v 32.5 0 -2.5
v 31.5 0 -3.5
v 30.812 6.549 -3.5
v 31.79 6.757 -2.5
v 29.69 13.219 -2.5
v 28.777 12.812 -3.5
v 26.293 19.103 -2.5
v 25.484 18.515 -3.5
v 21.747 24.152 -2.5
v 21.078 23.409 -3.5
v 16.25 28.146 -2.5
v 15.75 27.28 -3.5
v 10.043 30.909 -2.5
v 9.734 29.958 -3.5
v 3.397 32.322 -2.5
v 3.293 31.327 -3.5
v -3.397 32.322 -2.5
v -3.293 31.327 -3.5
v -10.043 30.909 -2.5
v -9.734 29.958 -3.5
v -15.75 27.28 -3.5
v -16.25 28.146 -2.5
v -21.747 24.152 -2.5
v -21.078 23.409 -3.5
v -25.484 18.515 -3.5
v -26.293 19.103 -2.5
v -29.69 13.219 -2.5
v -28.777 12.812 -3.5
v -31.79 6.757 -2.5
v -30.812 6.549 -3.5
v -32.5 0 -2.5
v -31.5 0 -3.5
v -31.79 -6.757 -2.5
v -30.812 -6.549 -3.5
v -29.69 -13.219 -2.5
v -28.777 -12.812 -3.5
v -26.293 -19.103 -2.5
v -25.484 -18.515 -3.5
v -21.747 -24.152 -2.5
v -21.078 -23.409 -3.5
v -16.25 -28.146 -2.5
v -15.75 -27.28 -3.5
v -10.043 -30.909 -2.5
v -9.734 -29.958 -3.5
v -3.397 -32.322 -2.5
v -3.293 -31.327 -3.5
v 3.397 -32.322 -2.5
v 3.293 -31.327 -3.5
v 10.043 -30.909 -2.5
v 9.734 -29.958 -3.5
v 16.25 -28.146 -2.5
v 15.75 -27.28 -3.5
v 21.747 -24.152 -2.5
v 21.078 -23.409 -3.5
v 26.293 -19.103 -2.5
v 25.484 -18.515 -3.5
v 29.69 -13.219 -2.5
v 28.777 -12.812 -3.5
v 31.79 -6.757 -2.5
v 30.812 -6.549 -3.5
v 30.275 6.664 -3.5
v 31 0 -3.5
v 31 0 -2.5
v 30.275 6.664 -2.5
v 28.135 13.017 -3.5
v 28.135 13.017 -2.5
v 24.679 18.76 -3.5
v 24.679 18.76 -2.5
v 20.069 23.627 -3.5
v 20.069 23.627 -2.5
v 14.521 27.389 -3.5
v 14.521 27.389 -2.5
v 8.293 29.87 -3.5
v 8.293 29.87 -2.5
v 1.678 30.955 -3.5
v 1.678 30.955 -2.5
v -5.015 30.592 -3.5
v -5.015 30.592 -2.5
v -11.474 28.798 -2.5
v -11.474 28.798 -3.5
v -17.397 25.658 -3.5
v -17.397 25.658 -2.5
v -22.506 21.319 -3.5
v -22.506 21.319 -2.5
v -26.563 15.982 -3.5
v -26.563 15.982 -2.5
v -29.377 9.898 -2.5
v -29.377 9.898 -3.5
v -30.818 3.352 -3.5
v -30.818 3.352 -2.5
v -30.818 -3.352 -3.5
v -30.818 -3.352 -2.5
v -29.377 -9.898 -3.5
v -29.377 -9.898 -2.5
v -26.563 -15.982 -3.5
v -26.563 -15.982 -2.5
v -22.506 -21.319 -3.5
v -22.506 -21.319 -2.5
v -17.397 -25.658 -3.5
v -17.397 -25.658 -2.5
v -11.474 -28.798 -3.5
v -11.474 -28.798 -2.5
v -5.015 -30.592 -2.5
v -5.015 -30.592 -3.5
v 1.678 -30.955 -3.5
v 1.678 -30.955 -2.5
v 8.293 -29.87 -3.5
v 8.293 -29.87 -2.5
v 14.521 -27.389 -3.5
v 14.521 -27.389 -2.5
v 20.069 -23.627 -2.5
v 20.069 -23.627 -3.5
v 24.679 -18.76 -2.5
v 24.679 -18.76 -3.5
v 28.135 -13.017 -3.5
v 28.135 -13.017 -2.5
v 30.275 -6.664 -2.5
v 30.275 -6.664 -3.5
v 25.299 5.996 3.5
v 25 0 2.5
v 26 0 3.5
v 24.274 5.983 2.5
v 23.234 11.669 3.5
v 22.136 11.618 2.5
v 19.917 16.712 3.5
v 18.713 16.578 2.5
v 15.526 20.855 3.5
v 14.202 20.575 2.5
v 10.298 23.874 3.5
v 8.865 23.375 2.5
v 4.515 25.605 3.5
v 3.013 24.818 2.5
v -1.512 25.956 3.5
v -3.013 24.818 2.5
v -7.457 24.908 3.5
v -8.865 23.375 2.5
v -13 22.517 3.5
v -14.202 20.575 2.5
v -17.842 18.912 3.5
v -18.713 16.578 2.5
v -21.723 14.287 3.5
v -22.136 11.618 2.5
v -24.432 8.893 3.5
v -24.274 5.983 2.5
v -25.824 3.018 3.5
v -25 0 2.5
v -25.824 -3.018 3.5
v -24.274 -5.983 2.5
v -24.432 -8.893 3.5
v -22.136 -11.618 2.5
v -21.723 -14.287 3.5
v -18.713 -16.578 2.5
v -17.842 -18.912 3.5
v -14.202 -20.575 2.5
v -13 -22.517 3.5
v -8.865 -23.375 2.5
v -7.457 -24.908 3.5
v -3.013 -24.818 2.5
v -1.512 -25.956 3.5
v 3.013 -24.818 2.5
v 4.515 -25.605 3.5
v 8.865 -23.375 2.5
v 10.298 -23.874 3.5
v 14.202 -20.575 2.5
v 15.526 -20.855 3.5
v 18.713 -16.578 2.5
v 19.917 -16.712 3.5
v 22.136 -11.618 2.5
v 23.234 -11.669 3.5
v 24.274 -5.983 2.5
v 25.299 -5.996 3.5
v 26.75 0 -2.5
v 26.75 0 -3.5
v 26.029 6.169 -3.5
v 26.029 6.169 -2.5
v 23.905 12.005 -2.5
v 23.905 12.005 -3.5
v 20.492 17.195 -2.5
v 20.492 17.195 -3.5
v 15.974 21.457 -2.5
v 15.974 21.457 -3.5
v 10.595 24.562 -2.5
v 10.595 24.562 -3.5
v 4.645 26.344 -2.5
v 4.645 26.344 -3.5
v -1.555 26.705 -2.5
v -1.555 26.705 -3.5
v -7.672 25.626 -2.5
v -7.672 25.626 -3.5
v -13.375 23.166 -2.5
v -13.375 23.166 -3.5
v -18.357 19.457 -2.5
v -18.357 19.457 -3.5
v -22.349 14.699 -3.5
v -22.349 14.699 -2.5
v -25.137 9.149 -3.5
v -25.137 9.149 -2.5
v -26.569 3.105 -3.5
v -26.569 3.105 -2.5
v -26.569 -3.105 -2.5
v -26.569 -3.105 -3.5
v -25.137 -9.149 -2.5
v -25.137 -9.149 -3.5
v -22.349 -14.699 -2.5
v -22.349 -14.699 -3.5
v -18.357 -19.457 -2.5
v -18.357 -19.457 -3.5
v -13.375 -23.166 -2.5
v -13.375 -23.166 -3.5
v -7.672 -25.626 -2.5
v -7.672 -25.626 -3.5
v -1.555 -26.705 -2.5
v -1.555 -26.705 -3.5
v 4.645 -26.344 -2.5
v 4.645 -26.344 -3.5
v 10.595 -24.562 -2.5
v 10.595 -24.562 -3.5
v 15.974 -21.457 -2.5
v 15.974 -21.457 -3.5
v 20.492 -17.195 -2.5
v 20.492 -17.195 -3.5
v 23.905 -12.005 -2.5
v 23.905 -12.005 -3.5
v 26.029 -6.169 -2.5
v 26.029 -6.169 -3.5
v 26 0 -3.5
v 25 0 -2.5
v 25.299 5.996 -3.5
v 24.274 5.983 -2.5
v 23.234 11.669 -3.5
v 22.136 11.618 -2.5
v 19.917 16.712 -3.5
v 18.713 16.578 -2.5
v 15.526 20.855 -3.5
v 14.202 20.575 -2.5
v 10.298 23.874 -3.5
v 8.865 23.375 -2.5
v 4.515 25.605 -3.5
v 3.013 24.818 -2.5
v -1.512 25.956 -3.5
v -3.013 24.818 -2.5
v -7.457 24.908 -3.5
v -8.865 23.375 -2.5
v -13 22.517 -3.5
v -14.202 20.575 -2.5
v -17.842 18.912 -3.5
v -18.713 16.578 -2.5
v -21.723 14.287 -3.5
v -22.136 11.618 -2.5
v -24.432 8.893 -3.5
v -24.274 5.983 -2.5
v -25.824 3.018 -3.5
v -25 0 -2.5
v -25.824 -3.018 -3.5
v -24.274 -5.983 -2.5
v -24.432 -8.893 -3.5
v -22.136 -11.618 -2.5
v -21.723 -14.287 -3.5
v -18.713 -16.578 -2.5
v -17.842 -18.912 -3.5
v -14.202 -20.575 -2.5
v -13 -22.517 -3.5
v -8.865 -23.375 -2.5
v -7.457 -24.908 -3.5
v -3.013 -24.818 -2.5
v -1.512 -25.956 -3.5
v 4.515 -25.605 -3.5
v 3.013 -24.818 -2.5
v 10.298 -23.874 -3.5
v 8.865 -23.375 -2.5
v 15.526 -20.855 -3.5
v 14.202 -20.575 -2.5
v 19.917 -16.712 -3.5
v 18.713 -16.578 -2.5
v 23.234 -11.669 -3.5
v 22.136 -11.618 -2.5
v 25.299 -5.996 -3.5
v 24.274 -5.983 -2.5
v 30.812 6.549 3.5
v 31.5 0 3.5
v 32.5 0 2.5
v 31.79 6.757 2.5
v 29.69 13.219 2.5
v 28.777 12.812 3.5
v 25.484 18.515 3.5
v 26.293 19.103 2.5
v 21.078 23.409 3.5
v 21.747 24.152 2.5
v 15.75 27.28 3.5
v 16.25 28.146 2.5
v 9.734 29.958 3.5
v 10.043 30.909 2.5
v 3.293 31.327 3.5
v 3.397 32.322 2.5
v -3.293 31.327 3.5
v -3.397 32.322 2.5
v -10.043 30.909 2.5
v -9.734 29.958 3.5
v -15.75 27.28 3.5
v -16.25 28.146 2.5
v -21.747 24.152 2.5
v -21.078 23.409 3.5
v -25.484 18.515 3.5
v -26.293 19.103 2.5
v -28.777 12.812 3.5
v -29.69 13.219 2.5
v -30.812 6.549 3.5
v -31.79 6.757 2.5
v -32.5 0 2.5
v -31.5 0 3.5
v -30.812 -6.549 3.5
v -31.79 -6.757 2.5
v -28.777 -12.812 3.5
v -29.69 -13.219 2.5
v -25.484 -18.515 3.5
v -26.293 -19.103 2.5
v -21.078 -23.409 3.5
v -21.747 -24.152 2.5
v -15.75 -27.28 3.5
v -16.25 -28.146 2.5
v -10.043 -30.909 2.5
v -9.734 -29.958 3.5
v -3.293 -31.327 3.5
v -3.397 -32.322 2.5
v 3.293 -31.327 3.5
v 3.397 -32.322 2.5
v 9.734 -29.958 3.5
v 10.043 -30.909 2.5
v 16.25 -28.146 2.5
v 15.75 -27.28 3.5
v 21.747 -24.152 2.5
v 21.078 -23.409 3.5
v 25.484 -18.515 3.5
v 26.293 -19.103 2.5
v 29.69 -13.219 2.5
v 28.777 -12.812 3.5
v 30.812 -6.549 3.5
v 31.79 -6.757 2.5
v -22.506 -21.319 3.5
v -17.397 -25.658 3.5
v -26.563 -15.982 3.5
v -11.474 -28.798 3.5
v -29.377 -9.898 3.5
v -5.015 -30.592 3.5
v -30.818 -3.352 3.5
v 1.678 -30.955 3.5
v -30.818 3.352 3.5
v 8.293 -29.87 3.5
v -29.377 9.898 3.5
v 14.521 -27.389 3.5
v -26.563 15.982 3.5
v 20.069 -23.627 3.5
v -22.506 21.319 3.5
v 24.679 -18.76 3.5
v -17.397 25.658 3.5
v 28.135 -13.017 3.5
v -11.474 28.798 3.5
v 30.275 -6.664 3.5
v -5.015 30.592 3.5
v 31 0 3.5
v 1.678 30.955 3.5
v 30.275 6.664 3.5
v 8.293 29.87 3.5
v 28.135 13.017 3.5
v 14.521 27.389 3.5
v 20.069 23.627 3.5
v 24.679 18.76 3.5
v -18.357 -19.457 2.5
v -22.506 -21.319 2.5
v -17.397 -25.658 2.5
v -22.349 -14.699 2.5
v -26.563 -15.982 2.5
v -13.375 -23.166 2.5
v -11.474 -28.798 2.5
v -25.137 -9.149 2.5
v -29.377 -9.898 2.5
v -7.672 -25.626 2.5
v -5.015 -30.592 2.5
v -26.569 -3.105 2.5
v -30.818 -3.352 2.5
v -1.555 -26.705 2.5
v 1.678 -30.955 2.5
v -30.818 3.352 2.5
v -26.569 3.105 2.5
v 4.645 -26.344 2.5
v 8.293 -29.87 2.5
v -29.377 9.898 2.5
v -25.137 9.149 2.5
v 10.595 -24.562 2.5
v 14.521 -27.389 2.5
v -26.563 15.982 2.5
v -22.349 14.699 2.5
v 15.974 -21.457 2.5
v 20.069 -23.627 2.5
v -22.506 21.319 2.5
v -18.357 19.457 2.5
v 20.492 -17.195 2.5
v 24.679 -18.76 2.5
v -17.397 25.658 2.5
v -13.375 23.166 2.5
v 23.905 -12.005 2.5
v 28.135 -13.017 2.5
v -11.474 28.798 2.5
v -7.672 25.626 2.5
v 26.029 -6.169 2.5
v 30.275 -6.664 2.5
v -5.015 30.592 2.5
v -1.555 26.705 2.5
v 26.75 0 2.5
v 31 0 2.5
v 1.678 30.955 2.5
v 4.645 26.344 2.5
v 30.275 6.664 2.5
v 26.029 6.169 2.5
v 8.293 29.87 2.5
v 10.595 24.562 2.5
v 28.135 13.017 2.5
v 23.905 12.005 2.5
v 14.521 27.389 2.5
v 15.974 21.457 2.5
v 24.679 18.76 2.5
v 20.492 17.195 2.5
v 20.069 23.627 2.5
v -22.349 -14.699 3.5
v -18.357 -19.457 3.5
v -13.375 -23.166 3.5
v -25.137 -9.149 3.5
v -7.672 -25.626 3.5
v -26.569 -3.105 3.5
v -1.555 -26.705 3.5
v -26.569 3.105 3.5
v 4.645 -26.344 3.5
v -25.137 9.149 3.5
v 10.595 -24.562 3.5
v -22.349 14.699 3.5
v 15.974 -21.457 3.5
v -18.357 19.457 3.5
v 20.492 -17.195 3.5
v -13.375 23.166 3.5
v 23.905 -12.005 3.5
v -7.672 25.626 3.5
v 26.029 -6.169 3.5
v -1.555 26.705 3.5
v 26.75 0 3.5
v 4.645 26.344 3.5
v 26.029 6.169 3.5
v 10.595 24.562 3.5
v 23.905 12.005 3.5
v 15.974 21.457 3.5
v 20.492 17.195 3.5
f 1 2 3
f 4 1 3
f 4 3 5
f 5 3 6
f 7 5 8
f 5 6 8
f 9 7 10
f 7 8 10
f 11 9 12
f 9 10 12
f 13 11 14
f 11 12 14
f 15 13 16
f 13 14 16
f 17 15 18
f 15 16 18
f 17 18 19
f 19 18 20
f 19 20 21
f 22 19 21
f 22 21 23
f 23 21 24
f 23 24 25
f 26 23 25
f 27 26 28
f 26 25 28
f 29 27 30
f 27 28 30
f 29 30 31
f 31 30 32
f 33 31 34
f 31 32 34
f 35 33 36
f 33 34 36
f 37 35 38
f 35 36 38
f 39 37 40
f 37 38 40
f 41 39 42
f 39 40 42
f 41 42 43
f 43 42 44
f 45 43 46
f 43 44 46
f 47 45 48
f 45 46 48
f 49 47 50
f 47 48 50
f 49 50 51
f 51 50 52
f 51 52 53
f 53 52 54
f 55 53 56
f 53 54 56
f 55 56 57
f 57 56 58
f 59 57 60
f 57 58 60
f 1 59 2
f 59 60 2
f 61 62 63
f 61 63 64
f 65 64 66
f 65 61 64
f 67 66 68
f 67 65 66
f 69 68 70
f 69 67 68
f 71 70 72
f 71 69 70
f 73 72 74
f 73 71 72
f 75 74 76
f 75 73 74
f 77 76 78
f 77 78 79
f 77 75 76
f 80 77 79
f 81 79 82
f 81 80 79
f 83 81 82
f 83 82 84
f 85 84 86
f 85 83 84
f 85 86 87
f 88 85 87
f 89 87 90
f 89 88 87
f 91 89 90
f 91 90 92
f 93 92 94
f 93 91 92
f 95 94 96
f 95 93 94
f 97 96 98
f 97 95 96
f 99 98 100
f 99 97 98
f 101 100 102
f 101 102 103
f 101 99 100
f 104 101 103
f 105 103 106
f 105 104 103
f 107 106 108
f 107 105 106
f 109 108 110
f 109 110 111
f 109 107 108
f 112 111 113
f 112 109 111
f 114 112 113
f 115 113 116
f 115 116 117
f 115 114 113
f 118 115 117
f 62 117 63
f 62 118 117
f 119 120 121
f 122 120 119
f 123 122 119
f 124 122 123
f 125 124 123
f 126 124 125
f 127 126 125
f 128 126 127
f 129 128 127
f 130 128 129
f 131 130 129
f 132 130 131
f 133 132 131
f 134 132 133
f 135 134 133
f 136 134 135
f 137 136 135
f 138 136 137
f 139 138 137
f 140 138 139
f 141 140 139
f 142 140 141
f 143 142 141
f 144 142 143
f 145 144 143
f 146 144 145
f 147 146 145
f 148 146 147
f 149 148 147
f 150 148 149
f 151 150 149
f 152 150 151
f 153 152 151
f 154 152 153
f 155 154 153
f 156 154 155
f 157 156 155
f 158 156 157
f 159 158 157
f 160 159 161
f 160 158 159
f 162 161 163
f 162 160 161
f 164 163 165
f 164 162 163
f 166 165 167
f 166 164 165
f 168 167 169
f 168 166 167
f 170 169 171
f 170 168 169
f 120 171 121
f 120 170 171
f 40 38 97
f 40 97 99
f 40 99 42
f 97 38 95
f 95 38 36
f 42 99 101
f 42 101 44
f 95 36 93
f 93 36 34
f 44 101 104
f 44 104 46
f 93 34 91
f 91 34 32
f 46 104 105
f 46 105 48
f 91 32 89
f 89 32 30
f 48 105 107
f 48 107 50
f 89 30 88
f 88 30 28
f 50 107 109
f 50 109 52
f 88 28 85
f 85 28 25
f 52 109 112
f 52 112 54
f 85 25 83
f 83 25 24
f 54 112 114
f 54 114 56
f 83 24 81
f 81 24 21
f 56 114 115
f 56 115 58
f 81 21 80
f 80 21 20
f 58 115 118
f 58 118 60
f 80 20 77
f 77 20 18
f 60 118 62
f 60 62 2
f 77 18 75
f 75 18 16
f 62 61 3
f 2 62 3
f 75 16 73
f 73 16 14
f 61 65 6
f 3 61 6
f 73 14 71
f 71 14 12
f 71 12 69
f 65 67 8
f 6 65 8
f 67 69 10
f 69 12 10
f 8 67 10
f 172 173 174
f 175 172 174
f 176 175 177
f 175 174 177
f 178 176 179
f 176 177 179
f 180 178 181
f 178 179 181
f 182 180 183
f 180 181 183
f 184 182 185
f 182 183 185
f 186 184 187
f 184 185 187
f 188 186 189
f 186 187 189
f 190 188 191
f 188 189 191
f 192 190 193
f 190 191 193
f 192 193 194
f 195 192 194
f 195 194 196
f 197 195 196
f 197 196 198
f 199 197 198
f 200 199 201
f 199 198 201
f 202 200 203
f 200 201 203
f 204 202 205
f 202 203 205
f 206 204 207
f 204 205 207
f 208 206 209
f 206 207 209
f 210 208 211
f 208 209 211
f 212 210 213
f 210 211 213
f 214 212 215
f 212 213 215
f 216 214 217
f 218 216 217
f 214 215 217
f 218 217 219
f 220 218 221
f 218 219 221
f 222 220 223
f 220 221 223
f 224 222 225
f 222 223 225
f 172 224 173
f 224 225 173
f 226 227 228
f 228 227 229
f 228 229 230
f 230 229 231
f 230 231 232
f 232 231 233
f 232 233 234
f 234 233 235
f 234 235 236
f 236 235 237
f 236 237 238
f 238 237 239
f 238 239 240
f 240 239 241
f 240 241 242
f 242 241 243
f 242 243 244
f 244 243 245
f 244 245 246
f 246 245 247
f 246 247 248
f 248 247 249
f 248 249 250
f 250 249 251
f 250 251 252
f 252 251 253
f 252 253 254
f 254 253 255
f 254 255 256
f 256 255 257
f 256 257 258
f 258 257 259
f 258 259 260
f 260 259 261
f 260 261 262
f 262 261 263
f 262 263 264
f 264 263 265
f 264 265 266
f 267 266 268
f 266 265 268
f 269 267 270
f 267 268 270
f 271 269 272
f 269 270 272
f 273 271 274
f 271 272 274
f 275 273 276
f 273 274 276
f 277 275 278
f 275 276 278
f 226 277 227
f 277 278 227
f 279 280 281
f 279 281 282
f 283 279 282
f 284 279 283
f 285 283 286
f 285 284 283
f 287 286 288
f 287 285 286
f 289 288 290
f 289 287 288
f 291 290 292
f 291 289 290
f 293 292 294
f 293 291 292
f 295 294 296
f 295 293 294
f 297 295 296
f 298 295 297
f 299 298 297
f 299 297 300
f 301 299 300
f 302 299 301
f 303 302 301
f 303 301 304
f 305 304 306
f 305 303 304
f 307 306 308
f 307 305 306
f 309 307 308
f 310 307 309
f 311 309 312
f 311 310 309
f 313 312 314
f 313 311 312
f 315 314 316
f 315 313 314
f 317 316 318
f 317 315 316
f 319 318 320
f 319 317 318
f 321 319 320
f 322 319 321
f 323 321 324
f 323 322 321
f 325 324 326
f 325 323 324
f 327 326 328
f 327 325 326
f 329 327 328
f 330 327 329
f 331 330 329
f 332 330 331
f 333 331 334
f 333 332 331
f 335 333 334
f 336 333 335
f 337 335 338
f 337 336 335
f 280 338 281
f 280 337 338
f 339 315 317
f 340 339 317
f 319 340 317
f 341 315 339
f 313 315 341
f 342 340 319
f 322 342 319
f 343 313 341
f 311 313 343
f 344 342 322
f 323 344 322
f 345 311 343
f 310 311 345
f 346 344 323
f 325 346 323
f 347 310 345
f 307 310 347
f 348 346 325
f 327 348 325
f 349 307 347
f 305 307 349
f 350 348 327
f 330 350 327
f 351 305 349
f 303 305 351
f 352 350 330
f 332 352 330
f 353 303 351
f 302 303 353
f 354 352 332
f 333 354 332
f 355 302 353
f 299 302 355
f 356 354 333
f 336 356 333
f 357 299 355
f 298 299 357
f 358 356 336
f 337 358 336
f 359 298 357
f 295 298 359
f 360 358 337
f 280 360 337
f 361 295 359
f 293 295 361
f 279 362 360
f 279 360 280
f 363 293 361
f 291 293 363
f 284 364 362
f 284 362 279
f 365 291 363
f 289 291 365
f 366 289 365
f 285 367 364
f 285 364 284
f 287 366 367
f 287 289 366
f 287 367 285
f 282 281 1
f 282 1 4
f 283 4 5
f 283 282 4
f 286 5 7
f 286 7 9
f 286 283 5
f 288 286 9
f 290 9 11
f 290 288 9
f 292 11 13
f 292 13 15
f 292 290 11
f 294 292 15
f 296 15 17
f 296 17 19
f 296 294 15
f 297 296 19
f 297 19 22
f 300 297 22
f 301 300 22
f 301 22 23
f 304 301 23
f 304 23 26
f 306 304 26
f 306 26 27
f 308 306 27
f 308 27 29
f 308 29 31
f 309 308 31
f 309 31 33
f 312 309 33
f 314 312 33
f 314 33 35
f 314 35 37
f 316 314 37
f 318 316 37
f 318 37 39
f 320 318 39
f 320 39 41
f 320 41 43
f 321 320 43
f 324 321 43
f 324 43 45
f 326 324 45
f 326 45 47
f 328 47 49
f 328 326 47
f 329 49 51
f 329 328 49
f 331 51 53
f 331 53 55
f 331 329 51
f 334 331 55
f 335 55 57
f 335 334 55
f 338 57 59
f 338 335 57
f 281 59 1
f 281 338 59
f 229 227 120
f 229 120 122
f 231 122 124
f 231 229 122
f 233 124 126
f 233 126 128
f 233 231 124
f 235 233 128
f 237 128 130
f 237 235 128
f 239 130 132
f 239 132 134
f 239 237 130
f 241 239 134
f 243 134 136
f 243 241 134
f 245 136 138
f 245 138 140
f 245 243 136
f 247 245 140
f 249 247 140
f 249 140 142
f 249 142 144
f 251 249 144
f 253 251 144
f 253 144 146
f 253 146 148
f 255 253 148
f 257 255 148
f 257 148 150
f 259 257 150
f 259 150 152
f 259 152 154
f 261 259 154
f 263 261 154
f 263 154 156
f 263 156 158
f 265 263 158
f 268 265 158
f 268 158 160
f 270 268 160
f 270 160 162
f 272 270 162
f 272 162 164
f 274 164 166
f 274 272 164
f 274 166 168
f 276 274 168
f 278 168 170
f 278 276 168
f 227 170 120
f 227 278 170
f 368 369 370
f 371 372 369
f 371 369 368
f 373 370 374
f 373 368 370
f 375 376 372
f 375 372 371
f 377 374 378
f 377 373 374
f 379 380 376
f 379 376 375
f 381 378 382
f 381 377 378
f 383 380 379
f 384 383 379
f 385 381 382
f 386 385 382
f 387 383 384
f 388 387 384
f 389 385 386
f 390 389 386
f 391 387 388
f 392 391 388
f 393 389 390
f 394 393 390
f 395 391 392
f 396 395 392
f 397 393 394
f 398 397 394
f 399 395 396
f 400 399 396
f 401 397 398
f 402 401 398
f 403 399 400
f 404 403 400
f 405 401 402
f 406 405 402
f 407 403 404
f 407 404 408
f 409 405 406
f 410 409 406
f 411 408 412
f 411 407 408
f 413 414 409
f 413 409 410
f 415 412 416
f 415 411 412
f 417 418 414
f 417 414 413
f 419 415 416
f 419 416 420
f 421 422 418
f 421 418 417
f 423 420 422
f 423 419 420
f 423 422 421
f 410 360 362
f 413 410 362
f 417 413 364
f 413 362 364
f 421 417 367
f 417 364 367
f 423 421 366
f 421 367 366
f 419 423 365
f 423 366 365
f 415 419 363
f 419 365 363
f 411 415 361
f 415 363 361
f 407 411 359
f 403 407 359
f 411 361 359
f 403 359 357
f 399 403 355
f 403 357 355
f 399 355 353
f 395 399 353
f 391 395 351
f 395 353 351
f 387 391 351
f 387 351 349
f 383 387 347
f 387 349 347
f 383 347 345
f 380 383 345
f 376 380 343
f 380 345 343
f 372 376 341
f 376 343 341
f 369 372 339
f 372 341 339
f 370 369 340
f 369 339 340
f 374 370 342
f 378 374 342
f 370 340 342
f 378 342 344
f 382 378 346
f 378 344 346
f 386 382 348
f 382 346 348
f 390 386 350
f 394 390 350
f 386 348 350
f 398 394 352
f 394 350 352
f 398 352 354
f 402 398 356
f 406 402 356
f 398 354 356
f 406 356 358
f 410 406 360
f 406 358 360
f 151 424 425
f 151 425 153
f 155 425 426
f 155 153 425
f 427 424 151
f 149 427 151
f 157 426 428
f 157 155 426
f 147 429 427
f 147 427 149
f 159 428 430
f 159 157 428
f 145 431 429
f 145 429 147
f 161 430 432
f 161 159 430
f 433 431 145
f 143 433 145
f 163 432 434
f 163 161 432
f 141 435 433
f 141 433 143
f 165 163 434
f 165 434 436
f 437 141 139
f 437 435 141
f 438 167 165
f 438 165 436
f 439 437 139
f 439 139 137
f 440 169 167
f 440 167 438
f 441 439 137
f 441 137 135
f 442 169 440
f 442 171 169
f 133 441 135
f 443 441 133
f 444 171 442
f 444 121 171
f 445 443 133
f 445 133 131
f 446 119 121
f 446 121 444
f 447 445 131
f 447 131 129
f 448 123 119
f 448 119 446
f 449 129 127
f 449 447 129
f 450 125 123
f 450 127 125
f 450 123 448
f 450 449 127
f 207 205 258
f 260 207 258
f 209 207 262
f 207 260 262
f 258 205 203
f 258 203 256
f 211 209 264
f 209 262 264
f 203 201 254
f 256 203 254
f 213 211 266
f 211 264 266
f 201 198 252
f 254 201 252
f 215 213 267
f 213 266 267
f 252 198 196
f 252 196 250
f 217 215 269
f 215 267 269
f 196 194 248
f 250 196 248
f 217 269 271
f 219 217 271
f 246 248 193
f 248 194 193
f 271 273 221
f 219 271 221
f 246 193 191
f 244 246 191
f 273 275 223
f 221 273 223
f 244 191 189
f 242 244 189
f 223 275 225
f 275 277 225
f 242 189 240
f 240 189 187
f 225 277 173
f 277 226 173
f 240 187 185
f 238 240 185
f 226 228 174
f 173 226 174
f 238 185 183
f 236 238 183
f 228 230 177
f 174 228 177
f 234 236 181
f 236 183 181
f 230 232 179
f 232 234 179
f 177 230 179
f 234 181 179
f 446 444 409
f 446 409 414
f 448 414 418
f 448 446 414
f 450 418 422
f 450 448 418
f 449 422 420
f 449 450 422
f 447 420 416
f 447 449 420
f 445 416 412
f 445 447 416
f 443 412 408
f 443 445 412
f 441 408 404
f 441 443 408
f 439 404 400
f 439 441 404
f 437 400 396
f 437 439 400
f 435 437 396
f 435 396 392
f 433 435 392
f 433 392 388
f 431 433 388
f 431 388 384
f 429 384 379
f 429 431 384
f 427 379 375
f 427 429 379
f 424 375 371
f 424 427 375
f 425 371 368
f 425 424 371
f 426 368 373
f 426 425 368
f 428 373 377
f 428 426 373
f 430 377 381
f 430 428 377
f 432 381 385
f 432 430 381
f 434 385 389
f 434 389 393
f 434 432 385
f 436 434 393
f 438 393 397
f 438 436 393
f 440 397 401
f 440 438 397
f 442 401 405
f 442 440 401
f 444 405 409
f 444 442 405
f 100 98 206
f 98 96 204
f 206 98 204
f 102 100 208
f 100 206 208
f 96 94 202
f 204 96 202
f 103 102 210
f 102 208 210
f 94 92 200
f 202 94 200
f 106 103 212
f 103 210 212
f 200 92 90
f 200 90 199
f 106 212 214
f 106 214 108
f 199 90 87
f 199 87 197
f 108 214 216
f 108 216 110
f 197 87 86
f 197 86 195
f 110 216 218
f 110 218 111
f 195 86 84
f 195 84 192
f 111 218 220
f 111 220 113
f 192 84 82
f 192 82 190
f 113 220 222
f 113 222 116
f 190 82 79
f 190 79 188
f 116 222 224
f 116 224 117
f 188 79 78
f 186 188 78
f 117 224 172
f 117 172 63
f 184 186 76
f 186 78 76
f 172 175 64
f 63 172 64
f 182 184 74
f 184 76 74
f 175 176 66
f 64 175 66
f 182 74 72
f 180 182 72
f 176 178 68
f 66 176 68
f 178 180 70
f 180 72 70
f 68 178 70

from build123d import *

# Parameters (mm, degrees)
SKETCH1_R           = 32.5
SKETCH1_R_2         = 25
BOSS_EXTRUDE1_DEPTH = 3.5
SKETCH2_R           = 31
SKETCH2_R_2         = 26.75
CUT_EXTRUDE1_DEPTH  = 1
CHAMFER1_SIZE       = 1


with BuildPart() as part:
    # Sketch1 → Boss-Extrude1 (new, symmetric)
    with BuildSketch(Plane.XY):
        Circle(SKETCH1_R)
        Circle(SKETCH1_R_2, mode=Mode.SUBTRACT)
    extrude(amount=BOSS_EXTRUDE1_DEPTH, both=True)

    # Sketch2 → Cut-Extrude1 (cut)
    with BuildSketch(Plane.XY.offset(3.5)):
        Circle(SKETCH2_R)
        Circle(SKETCH2_R_2, mode=Mode.SUBTRACT)
    cut_extrude1 = extrude(amount=-CUT_EXTRUDE1_DEPTH, mode=Mode.SUBTRACT)

    # Mirror1: Cut-Extrude1 across plane
    add(cut_extrude1.mirror(Plane.XY), mode=Mode.SUBTRACT)

    # Chamfer1
    chamfer1_edges = [part.edges().sort_by_distance(p)[0] for p in [
        (-32.5, 0, -3.5),
        (-32.5, 0, 3.5),
        (-25, 0, -3.5),
        (-25, 0, 3.5),
    ]]
    chamfer(chamfer1_edges, length=CHAMFER1_SIZE)


solid = part.part
